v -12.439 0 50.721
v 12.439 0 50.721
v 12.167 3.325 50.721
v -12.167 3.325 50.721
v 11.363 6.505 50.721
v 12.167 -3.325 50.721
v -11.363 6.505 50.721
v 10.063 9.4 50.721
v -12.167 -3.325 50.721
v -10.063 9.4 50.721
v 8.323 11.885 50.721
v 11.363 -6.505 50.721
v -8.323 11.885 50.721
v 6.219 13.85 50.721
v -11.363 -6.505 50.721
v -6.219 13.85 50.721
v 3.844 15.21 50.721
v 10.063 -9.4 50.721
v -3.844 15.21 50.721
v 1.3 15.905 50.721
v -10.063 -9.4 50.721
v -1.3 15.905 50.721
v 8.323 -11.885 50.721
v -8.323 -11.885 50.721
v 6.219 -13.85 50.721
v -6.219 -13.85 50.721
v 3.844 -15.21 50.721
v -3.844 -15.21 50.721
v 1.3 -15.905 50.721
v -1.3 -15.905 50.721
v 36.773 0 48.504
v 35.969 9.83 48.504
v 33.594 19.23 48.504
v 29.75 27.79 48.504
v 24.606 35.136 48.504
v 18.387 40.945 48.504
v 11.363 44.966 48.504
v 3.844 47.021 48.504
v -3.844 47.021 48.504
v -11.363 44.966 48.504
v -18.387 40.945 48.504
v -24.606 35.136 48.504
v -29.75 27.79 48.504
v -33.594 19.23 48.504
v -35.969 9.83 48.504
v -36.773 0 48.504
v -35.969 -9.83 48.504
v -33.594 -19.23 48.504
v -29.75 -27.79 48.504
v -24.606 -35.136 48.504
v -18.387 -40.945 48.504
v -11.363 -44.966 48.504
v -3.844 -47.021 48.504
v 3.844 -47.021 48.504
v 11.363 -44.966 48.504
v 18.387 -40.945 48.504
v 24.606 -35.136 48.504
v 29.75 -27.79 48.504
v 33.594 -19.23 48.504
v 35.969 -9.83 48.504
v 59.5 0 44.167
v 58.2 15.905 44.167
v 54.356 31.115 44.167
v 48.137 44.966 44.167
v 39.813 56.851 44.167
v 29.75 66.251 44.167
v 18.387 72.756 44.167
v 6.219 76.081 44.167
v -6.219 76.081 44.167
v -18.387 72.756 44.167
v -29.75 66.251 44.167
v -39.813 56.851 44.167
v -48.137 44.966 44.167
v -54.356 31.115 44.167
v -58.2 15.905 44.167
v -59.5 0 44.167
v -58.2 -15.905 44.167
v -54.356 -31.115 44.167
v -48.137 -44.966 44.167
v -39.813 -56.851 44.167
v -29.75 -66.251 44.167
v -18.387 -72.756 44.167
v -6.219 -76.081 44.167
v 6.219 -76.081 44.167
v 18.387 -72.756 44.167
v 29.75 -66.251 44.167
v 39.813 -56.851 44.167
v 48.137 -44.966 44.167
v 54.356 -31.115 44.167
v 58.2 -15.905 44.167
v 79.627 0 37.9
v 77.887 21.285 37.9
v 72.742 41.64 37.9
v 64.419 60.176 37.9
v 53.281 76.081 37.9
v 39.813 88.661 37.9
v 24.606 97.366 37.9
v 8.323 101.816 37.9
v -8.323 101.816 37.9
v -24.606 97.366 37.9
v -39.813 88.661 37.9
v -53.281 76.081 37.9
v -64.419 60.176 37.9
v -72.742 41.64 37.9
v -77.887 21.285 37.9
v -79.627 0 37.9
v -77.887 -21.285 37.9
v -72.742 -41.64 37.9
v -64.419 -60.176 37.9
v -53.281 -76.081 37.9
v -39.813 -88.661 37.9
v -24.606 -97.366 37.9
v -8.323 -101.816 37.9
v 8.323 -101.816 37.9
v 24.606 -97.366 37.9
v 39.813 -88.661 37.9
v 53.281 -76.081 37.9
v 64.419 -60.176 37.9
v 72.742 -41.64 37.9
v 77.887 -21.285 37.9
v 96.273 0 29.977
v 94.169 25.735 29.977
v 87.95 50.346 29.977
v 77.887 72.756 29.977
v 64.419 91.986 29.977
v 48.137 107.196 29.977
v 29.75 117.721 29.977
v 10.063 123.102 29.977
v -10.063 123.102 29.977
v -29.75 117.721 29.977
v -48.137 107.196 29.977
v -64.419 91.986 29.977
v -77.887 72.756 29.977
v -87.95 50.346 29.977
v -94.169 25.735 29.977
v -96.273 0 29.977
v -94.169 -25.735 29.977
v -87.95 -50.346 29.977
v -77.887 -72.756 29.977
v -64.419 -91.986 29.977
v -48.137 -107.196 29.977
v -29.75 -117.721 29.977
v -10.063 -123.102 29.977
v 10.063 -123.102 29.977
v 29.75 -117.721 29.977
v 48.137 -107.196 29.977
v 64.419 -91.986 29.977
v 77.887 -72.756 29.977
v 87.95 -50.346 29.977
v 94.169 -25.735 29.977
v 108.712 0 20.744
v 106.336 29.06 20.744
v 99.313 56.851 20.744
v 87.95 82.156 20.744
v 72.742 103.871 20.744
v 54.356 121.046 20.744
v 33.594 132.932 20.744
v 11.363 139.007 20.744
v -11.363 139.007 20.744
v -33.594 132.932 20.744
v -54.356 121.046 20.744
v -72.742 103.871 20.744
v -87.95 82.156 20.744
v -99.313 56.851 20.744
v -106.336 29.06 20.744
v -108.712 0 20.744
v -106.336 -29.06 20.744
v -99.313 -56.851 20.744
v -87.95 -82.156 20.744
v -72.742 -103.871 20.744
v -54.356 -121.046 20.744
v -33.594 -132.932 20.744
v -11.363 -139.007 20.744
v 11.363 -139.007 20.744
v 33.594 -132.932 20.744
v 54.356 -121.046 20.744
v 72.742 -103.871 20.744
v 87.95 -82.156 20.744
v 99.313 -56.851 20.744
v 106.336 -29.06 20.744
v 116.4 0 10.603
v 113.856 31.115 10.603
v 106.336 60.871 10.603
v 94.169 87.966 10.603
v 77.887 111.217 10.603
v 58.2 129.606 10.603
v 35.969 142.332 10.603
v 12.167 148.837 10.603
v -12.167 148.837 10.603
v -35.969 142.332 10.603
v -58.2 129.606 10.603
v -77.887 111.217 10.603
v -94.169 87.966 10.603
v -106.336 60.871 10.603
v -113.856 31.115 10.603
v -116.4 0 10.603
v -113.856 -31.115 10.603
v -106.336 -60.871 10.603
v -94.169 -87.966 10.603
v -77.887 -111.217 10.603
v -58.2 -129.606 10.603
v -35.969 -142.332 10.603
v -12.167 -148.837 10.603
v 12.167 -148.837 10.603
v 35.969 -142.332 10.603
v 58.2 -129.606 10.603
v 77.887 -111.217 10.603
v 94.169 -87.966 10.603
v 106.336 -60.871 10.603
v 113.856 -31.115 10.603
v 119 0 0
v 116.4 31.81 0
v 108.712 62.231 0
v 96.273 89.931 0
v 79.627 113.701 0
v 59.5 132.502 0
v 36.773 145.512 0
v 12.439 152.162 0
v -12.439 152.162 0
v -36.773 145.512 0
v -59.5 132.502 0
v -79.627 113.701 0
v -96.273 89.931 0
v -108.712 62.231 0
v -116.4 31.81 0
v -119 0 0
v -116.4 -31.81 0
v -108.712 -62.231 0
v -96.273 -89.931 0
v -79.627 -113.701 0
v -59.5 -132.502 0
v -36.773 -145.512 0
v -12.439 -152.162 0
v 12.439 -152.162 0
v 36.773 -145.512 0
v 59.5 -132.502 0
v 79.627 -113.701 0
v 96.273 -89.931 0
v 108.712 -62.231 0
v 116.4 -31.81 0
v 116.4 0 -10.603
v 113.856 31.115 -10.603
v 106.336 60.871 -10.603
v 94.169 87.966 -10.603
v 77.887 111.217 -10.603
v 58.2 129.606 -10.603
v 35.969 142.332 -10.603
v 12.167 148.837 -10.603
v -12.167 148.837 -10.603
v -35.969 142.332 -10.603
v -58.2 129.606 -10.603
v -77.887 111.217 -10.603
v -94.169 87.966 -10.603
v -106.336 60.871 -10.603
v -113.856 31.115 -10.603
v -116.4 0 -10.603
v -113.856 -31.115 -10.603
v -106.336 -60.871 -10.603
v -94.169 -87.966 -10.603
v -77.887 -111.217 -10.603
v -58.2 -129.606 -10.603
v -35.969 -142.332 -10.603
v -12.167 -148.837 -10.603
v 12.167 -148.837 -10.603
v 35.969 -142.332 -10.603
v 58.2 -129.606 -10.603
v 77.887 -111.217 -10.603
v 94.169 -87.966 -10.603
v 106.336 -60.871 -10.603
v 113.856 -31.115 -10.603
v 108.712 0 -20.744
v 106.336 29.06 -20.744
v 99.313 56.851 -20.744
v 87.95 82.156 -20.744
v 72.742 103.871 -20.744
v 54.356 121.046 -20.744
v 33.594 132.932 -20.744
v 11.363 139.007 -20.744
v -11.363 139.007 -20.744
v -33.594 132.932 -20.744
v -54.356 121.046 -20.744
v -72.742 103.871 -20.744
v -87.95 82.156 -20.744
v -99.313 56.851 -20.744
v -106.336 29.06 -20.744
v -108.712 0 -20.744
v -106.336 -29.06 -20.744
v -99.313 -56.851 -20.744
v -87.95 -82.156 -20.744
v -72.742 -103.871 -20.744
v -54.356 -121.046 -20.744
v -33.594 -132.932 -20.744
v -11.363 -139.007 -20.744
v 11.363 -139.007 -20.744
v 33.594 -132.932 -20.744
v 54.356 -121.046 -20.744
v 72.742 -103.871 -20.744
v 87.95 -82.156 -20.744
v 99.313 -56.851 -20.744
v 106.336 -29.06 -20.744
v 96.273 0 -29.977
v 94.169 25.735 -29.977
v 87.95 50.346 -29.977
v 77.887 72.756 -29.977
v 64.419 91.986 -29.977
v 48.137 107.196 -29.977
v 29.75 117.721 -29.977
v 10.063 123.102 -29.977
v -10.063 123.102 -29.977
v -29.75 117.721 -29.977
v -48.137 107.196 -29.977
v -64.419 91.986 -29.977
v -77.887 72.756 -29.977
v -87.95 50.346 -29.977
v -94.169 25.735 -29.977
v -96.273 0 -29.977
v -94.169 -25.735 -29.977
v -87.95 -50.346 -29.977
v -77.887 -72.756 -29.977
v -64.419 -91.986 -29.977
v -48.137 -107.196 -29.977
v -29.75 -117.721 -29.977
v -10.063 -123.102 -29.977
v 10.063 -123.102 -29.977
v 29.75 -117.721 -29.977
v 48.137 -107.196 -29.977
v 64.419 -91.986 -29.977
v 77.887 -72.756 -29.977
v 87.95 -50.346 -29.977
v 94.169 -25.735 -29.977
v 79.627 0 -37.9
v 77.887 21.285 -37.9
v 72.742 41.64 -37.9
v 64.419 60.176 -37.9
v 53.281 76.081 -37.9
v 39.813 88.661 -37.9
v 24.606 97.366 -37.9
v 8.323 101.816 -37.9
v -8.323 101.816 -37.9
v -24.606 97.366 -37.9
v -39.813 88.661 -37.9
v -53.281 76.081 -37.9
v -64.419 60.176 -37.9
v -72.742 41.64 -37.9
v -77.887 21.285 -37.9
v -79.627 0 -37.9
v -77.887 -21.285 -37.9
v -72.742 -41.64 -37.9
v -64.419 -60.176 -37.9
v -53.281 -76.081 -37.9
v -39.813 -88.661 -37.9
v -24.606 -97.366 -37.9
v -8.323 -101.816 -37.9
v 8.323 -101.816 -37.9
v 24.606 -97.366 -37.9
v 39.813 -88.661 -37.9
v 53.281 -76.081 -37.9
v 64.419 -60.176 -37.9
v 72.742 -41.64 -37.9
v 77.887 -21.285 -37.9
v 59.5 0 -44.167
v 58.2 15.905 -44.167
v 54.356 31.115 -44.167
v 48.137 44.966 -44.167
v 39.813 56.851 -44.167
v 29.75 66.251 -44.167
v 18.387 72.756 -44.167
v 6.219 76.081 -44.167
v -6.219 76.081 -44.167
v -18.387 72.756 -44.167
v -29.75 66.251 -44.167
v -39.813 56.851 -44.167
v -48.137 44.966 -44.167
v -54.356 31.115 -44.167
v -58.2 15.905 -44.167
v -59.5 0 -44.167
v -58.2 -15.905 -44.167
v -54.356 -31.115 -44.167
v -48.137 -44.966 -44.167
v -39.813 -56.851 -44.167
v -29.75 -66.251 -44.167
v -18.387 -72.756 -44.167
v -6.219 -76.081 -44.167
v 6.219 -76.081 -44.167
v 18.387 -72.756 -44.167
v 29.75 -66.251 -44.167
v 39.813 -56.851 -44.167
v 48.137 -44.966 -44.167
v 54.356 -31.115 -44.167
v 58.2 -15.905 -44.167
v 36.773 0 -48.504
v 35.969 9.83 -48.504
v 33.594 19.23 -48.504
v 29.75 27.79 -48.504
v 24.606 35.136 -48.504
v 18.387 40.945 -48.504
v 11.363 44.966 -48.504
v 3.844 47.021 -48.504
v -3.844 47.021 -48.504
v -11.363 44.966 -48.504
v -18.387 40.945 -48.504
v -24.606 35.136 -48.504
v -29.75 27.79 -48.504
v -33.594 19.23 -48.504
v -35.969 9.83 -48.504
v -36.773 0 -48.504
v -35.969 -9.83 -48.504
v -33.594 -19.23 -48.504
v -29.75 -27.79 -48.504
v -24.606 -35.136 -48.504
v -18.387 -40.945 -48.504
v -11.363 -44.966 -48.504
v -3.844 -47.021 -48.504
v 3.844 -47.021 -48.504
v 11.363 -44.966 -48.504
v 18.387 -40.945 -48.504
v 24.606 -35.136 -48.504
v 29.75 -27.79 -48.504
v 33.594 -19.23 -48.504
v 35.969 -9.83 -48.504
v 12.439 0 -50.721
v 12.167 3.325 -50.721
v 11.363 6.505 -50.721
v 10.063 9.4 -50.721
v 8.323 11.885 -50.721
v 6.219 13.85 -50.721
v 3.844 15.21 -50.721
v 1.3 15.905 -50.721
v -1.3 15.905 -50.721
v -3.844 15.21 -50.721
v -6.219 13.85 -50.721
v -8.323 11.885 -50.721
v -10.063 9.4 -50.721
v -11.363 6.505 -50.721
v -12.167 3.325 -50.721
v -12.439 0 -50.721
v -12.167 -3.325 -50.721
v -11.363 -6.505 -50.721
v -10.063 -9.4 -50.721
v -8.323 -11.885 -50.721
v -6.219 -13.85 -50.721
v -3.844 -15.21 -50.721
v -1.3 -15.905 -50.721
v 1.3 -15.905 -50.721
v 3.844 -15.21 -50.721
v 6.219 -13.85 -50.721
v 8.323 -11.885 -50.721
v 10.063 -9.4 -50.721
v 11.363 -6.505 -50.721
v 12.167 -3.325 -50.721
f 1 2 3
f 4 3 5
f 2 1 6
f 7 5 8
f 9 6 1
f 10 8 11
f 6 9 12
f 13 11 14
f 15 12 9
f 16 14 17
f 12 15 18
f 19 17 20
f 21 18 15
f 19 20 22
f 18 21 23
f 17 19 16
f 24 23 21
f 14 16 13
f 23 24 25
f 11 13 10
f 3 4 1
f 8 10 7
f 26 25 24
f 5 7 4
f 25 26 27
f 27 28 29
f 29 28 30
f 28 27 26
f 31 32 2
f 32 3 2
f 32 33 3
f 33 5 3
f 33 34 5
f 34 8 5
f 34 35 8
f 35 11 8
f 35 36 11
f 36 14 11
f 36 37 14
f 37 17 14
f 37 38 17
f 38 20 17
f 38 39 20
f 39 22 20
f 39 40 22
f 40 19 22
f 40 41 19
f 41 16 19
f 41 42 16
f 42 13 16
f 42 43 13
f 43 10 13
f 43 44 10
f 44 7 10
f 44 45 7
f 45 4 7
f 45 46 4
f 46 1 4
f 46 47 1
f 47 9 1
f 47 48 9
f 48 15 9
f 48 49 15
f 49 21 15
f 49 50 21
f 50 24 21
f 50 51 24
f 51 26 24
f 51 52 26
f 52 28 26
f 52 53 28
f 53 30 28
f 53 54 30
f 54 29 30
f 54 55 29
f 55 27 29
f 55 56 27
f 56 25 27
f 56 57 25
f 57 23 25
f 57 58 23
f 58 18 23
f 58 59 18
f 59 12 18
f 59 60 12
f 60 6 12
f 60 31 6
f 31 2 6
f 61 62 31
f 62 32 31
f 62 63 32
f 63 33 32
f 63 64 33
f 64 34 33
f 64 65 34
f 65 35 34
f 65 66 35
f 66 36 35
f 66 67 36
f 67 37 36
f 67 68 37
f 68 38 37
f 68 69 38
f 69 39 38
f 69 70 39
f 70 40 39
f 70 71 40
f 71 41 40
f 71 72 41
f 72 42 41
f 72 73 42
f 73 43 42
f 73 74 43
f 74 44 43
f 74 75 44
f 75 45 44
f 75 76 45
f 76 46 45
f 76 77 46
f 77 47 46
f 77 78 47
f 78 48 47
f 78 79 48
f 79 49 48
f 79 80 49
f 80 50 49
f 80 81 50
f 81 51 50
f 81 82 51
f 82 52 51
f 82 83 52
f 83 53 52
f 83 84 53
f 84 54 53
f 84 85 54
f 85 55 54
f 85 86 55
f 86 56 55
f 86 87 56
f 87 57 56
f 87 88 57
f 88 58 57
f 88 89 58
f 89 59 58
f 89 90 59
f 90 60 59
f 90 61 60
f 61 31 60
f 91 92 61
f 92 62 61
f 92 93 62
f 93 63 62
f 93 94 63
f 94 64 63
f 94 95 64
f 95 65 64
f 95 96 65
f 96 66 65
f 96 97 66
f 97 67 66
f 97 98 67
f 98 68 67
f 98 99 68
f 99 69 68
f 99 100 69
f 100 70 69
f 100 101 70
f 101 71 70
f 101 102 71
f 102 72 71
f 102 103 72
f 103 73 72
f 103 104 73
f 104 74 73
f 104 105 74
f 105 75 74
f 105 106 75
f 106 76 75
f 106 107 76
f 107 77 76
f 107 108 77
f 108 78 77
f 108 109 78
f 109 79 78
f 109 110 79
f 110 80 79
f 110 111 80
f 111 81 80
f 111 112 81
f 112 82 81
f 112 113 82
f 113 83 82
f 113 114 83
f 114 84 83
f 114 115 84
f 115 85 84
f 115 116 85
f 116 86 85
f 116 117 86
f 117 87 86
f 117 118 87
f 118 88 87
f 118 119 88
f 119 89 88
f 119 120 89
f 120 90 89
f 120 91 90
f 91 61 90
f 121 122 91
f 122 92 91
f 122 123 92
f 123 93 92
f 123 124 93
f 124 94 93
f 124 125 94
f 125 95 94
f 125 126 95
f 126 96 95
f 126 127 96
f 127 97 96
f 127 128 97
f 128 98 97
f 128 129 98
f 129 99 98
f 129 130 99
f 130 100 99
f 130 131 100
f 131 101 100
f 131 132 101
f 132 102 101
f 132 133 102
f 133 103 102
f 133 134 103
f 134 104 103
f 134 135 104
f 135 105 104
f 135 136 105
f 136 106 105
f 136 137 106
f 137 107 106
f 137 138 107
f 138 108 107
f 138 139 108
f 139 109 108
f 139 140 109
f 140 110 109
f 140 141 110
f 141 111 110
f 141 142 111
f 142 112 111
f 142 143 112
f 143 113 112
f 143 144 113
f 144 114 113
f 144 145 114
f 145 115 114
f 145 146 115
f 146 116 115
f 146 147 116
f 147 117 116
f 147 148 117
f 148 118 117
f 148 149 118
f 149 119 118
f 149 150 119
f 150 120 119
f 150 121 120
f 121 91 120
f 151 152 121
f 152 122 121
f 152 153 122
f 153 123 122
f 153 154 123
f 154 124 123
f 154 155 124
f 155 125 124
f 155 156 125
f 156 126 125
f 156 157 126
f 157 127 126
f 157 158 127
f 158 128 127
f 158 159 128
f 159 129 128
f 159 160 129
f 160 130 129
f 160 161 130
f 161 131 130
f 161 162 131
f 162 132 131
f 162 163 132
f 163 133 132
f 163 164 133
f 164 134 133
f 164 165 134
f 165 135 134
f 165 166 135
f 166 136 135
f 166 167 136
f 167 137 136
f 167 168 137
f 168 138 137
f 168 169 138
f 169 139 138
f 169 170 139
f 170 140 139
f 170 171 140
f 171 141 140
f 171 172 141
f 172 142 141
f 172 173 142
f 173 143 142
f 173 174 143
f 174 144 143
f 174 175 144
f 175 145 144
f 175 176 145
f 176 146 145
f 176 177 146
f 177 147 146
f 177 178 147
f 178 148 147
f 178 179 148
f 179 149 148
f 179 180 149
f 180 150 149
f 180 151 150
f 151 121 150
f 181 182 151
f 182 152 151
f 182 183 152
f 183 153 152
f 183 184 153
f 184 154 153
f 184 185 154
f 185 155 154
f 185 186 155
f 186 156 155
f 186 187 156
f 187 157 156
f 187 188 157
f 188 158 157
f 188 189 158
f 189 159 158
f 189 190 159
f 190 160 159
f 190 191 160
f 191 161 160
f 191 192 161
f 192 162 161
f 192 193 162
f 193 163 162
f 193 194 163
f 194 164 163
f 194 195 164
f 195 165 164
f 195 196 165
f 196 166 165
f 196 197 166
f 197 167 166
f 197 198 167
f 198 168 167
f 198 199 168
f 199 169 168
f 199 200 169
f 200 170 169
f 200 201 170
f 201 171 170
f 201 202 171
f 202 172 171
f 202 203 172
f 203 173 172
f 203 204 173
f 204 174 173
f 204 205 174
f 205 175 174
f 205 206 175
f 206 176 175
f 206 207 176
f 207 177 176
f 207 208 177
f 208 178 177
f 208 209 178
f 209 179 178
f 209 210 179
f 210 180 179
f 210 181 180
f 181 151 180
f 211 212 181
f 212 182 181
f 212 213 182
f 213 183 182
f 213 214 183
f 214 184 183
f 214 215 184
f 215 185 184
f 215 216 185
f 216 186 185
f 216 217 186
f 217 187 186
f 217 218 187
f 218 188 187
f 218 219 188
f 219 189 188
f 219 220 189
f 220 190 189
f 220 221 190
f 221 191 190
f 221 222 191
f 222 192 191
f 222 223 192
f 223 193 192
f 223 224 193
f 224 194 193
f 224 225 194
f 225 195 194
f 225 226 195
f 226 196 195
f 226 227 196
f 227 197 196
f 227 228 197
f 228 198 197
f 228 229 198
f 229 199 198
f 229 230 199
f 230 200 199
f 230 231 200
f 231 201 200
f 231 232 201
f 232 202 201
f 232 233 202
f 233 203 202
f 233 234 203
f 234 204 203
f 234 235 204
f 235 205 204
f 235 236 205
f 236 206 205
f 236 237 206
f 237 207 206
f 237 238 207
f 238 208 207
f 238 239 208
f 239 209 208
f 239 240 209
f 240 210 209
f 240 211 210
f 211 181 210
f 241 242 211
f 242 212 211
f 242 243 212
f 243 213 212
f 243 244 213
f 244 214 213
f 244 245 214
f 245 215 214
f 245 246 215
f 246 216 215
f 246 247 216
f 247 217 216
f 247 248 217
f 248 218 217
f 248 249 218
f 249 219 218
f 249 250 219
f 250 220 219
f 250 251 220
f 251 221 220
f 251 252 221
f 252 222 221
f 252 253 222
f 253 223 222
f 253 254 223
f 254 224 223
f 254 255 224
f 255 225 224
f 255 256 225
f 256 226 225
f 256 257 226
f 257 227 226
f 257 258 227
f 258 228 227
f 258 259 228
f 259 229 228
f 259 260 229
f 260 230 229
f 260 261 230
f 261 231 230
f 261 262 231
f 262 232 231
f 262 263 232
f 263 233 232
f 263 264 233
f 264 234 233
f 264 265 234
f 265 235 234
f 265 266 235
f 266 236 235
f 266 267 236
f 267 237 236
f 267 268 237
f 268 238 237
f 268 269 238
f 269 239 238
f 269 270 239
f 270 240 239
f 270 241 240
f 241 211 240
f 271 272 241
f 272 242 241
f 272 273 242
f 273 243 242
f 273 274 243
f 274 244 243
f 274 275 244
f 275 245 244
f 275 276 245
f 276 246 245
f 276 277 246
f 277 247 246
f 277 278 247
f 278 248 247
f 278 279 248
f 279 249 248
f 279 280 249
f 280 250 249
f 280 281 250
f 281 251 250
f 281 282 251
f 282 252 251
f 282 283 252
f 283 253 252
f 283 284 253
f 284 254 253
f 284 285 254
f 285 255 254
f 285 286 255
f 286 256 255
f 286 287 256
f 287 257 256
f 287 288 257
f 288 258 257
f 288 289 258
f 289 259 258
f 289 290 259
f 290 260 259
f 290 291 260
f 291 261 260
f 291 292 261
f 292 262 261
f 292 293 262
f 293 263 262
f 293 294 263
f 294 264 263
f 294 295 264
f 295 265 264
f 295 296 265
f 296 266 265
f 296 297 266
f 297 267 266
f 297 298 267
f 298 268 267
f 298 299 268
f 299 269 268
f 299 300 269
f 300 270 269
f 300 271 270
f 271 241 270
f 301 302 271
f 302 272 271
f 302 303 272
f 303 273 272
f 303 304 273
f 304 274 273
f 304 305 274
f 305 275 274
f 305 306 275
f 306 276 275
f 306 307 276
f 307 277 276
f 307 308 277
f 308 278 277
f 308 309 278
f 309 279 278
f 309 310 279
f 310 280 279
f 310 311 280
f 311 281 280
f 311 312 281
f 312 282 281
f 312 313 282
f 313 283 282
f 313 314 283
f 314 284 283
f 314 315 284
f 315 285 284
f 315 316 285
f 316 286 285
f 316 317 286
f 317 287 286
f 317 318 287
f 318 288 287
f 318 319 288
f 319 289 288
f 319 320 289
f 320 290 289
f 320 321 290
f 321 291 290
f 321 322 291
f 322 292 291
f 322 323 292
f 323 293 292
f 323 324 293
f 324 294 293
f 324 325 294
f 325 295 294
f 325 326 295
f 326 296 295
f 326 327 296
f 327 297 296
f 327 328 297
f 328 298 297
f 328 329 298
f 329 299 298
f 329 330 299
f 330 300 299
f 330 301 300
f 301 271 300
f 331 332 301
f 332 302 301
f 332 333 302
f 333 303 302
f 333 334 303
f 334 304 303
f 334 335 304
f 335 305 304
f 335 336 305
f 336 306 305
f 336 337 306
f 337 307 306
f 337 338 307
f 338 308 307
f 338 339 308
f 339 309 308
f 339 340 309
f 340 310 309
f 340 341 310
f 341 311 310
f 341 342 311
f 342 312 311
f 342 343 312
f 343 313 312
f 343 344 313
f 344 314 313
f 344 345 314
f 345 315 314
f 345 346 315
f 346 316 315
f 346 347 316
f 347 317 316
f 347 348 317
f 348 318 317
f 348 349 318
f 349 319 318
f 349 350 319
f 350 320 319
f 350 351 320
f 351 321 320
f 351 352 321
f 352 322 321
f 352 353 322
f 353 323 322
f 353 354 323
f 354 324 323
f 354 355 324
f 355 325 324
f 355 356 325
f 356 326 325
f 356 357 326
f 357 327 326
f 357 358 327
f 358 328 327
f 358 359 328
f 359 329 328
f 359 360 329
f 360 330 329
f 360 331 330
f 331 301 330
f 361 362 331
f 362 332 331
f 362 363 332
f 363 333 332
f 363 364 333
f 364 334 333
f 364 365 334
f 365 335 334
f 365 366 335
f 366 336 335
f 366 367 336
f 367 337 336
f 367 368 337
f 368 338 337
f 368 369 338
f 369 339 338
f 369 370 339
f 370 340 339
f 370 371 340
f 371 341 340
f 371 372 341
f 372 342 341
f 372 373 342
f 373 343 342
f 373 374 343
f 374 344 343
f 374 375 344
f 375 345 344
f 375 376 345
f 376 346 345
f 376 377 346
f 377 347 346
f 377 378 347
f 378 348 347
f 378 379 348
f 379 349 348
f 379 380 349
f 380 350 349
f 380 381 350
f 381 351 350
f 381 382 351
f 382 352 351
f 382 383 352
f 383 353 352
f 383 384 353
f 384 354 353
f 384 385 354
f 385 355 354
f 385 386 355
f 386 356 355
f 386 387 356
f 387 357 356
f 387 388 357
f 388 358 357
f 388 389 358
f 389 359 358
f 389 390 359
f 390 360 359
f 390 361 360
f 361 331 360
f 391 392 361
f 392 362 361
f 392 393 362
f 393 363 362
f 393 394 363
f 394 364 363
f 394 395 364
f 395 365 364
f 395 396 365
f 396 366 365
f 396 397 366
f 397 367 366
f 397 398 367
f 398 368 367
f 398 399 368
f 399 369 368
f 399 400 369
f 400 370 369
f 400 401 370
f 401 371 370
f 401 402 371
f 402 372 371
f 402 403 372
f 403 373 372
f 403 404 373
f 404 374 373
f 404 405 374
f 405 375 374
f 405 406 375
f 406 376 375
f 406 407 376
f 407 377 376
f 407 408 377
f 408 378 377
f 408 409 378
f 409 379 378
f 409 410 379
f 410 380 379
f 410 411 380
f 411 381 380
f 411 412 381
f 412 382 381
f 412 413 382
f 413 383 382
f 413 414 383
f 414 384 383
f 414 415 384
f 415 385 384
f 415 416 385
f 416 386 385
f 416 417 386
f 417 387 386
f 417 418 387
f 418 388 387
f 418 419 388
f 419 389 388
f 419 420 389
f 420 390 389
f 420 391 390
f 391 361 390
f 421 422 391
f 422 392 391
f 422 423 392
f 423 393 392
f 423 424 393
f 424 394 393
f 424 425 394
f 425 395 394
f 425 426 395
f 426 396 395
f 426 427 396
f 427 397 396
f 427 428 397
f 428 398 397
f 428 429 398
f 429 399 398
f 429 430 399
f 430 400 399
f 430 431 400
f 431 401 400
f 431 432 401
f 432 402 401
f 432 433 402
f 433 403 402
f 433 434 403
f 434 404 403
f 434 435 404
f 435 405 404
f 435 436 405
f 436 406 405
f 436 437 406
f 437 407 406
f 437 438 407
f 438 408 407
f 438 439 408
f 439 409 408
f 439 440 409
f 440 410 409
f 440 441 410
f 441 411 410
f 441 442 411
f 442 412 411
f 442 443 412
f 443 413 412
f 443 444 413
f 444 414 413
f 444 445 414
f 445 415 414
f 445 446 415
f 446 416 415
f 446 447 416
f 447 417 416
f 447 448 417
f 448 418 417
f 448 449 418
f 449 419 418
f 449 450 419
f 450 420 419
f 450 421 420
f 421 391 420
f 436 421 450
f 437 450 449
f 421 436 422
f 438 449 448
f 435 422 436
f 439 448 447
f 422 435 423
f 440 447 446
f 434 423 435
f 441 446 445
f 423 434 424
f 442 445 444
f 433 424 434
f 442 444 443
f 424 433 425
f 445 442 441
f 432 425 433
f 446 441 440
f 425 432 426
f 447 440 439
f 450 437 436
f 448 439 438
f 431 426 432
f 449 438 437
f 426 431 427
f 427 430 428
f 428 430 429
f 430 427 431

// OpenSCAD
// Generated by SolidPython 1.0.1 on 2020-07-29 00:46:47


scale(v = [7, 9, 3]) {
	sphere(r = 17);
}
/***********************************************
*********      SolidPython code:      **********
************************************************
 
# import packages: SolidPython
from solid import *
from solid.utils import *
from itertools import chain, combinations, permutations


class Resize:

    def __init__(self, scad_file):
        self.scad_file = scad_file
        #self.scad_file = import_scad(scad_file)
        # cone/cylinder param:
        self.r1 = 0
        self.r2 = 0
        self.h = 0
        # rectangular prism param:
        self.w = 0
        self.l = 0
        # ellipse param:
        self.r = 0

    # import OpenScad code (file name corresponds to shape)


    # classify shape + parameters
    def assign(self, param1, param2, param3):
        if self.scad_file == 'cone.scad':
            self.r1 = param1
            self.r2 = param2
            self.h = param3
        elif self.scad_file == 'cylinder.scad':
            self.r1 = param1
            self.r2 = param2
            self.h = param3
        elif self.scad_file == 'rectangularPrism.scad':
            self.h = param1
            self.l = param2
            self.w = param3
        else:
            self.r = param1
            self.h = param2

    # resize parameters
    def iterate(self):
        x = range(3, 20, 2)
        i = 1
        if self.scad_file == 'cone.scad':
            tempList = list(permutations(x, 2))
            for temp in tempList:
                param1 = temp[0]
                param2 = temp[1]
                filepath = 'produced_scad_files/' + 'cone' + str(param1) + '_' + str(param2) + '_' + '.scad'
                scad_render_to_file(cylinder(h=param1, r1=param2, r2=0), filepath)

        elif self.scad_file == 'cylinder.scad':
            tempList = list(permutations(x, 3))
            for temp in tempList:
                param1 = temp[0]
                param2 = temp[1]
                filepath = 'produced_scad_files/' + 'cylinder' + str(param1) + '_' + str(param2) + '_' + '.scad'
                scad_render_to_file(cylinder(h=param1, r1=param2, r2=param2), filepath)

        elif self.scad_file == 'rectangularPrism.scad':
            tempList = list(permutations(x, 3))
            for temp in tempList:
                param1 = temp[0]
                param2 = temp[1]
                param3 = temp[2]
                filepath = 'produced_scad_files/' + 'rectangularPrism' + str(param1) + '_' + str(param2) + '_' + str(
                    param3) + '.scad'
                scad_render_to_file(cube(size=(param1, param2, param3)), filepath)

        elif self.scad_file == 'ellipse.scad':
            tempList = list(permutations(x, 4))
            for temp in tempList:
                param1 = temp[0]
                param2 = temp[1]
                param3 = temp[2]
                param4 = temp[3]
                filepath = 'produced_scad_files/' + 'ellipse' + str(param1) + '_' + str(param2) + '_' + str(param3) + '_' + str(param4) + '.scad'
                scad_render_to_file(scale([param1, param2, param3])(sphere(r=param4)), filepath)

    def render_to_scadfile(self):
        scad_render_to_file(scad, 'example.scad') 
 
************************************************/
